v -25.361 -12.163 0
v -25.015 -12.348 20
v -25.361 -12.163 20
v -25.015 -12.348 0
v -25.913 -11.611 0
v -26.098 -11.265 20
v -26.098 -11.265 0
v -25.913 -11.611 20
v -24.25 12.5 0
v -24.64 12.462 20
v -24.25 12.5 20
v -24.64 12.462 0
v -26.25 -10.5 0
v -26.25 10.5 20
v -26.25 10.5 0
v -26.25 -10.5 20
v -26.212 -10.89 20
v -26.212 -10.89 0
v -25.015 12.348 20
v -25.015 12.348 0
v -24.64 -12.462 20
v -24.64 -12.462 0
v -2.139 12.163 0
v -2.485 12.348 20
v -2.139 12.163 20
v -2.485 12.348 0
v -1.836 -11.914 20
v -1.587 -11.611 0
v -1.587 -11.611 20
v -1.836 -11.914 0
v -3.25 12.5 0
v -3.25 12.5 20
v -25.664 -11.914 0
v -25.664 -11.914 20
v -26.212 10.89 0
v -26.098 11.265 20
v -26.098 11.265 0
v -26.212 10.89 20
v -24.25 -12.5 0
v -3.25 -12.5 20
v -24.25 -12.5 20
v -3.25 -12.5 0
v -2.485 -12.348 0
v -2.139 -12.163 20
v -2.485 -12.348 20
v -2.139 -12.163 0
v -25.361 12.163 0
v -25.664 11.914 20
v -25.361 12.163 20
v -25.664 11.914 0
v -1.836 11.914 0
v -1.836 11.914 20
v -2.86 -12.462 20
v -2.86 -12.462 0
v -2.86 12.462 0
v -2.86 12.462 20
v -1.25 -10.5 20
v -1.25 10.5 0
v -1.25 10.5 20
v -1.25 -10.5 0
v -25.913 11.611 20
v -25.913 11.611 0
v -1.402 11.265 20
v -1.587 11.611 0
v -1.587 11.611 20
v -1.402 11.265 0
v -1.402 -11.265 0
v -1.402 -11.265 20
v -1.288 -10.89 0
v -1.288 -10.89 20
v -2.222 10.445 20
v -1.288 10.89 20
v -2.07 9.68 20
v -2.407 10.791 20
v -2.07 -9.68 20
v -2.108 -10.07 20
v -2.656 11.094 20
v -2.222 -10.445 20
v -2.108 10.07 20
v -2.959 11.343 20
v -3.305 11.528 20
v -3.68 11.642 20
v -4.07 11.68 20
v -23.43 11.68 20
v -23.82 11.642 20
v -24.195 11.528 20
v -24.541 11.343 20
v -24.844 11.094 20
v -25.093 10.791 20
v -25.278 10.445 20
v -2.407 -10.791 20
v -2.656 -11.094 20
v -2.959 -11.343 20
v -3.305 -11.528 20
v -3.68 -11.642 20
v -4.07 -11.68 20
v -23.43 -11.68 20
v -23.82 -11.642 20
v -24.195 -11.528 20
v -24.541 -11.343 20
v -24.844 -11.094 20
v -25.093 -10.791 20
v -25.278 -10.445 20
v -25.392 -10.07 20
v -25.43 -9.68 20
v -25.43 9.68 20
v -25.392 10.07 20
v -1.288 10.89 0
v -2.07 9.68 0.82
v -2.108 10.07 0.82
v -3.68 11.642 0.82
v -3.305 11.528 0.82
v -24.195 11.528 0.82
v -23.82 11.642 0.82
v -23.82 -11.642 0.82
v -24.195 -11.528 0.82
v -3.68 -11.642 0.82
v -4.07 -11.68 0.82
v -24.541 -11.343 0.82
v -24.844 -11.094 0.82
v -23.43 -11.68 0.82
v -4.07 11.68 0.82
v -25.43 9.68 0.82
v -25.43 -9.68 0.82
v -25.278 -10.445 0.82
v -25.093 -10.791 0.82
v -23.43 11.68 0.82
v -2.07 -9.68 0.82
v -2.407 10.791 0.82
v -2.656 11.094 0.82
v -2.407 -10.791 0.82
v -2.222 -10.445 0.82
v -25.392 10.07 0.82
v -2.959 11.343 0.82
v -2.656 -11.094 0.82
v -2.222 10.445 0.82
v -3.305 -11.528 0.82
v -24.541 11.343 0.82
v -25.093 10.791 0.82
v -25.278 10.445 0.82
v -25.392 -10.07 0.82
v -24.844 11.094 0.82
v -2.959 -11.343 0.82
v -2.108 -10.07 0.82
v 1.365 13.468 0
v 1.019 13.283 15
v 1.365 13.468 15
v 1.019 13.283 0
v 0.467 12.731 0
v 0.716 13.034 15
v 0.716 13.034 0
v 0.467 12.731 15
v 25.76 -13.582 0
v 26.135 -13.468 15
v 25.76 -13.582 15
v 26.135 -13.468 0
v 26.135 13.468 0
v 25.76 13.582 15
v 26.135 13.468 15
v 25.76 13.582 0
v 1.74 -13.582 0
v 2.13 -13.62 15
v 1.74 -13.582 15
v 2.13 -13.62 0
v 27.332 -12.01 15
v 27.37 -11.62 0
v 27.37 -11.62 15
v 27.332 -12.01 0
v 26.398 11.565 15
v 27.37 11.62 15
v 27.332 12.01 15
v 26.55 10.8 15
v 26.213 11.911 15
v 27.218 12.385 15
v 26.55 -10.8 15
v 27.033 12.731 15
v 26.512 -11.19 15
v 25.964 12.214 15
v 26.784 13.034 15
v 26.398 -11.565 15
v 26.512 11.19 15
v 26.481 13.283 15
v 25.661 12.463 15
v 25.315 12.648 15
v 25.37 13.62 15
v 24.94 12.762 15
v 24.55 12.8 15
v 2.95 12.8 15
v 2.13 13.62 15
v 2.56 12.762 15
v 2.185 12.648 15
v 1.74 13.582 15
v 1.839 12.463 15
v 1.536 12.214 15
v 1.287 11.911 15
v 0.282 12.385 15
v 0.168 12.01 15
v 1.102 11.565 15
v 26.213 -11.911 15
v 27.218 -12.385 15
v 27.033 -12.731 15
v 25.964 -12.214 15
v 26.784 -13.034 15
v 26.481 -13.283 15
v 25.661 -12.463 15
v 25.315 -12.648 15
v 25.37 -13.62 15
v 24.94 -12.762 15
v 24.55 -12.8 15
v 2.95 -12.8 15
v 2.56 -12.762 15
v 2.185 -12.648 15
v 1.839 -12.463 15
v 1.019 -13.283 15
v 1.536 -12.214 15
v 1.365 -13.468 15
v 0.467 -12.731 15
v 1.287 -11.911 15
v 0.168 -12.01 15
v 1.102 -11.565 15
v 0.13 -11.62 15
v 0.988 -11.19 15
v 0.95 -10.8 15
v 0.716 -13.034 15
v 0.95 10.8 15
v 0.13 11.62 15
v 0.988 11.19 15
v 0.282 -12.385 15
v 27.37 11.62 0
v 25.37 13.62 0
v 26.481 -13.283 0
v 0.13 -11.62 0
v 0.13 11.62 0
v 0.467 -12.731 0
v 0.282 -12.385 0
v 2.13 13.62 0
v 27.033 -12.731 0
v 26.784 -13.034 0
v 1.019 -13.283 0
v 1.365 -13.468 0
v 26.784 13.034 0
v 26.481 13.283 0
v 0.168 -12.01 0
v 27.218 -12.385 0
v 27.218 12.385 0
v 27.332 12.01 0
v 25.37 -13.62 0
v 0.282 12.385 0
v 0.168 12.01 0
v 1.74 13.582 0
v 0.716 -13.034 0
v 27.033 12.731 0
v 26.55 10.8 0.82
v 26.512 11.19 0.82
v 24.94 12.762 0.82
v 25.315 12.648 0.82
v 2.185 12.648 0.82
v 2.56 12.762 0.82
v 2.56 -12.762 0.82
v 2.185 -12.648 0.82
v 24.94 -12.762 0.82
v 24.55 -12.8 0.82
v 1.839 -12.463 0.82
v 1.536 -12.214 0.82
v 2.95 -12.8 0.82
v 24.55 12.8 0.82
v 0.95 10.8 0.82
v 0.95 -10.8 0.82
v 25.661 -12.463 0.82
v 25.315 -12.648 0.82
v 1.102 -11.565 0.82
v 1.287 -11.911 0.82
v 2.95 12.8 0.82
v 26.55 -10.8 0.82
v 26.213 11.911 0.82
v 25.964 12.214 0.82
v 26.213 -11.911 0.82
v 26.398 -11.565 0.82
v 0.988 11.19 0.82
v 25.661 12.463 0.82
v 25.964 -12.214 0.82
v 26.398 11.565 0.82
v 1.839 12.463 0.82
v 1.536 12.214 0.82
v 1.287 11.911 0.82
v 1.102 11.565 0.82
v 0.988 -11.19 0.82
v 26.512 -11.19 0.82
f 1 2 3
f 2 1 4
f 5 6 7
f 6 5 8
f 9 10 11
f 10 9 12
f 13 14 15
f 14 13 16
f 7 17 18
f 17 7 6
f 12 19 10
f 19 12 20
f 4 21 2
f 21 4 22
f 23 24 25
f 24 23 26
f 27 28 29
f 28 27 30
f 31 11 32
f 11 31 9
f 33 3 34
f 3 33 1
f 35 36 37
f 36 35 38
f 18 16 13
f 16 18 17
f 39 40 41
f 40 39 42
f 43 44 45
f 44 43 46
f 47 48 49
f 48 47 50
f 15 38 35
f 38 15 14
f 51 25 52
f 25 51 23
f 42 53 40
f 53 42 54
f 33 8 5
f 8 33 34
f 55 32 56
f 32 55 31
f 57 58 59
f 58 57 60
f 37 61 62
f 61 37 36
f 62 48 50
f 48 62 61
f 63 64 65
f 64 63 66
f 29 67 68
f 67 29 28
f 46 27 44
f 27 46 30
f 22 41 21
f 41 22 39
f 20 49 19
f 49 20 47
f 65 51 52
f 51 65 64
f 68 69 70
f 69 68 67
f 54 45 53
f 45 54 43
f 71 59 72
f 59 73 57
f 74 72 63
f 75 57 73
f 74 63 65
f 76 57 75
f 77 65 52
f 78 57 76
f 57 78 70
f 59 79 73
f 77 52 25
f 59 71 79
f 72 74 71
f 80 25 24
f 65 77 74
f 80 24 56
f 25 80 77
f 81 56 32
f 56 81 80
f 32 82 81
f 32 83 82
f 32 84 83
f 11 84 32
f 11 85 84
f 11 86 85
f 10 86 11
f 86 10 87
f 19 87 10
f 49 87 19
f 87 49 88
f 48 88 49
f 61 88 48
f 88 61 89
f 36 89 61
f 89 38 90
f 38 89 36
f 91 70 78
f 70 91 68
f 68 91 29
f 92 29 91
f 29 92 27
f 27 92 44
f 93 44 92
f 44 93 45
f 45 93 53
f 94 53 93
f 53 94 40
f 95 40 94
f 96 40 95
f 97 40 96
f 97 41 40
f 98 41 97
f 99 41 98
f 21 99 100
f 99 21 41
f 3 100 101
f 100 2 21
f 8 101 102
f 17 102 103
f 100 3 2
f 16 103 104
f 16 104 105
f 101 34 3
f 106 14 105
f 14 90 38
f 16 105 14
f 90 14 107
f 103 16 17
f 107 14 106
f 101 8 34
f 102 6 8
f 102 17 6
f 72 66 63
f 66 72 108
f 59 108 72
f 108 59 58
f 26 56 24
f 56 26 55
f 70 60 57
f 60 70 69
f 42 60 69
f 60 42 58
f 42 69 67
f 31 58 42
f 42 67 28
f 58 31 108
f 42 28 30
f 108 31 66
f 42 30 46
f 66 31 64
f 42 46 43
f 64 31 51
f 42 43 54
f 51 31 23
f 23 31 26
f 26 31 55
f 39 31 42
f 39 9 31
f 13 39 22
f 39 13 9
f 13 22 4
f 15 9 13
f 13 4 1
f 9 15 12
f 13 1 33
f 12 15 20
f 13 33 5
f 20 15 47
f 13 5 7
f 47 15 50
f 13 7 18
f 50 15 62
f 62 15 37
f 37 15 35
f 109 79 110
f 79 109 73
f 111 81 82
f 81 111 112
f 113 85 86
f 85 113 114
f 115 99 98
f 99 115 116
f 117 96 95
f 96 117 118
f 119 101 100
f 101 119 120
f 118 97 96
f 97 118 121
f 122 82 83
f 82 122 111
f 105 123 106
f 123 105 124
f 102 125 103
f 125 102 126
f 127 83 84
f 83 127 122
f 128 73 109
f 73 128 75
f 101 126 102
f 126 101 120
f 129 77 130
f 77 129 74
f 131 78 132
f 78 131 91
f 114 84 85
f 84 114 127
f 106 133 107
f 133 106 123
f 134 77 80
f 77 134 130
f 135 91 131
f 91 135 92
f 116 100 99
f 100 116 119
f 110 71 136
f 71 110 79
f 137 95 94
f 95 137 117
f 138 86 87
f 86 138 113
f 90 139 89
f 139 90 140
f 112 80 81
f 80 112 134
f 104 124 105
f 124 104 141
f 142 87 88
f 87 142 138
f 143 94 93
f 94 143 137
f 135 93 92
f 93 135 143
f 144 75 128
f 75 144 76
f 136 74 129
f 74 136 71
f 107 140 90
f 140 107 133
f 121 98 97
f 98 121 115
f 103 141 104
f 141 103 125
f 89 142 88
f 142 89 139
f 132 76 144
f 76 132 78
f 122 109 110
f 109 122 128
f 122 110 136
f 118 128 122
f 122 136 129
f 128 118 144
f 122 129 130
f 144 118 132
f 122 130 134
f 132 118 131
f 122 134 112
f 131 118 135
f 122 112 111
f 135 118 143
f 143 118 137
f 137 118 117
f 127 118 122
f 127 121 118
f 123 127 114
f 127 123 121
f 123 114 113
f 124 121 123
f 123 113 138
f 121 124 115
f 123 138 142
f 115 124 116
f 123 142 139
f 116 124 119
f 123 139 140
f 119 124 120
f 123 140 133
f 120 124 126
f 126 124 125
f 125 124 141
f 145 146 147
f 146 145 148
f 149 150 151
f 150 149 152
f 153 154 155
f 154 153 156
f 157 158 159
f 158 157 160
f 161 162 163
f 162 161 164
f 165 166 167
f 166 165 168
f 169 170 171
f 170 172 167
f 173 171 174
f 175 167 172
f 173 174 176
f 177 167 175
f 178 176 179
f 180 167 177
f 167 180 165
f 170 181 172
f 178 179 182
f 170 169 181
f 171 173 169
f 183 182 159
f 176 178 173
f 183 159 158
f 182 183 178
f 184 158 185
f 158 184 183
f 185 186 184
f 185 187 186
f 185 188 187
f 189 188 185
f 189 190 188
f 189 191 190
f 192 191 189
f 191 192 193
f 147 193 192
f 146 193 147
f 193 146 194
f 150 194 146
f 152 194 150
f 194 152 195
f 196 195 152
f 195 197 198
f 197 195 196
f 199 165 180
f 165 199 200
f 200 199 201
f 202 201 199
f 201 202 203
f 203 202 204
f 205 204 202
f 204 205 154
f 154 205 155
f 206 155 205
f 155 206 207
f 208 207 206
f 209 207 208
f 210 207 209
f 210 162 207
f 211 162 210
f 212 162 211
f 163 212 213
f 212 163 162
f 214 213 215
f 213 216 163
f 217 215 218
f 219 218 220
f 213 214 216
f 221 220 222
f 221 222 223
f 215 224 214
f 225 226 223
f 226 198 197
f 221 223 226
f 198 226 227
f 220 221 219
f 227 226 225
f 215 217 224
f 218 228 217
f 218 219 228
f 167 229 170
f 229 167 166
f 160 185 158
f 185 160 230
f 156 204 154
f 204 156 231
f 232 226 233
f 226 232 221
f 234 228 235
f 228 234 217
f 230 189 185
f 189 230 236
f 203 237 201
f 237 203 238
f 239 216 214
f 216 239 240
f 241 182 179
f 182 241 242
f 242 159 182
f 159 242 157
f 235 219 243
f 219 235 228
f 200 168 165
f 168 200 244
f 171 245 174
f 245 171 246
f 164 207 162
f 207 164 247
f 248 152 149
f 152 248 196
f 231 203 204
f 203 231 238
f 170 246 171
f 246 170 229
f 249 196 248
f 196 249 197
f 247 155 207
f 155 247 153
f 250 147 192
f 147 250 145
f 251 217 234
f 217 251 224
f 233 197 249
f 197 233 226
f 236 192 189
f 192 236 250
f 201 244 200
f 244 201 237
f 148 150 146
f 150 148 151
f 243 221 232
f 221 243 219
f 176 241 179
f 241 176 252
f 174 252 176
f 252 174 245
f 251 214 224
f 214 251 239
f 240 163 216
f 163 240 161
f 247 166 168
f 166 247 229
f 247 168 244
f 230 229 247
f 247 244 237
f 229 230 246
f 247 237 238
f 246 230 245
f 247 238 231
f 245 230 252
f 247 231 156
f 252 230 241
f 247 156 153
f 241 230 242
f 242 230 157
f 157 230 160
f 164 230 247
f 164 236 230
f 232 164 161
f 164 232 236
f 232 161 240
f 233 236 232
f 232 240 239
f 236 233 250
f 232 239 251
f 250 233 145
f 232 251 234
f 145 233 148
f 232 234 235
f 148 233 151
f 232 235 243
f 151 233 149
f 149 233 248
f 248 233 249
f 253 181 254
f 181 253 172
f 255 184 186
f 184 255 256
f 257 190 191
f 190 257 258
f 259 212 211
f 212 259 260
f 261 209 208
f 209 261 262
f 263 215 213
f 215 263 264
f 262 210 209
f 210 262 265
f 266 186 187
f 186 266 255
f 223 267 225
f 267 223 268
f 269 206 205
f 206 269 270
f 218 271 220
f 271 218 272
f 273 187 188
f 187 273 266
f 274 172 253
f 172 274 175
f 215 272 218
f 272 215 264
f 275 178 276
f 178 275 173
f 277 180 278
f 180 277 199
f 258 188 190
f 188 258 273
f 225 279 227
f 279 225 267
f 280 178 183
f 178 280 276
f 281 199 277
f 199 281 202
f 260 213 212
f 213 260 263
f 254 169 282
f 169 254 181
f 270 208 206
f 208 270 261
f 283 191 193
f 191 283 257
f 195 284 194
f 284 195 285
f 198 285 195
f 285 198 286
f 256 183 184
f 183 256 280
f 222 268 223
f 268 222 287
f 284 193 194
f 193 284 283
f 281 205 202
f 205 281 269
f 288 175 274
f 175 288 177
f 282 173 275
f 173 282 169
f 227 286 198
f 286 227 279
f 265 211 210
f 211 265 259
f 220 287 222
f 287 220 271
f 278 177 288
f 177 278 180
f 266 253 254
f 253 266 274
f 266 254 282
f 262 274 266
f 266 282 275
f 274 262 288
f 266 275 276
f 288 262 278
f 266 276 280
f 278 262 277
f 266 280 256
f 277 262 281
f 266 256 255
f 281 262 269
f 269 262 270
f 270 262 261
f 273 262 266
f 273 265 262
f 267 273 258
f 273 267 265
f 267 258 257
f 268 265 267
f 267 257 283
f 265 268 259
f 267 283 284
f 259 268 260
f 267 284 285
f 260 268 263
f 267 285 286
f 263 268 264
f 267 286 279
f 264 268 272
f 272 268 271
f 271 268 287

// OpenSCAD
wall_thickness = 0.82;          //Box perimiter thickness
lid_thickness = 0.82;           //lid top/bottom thickness
lid_clearance = 0.6;            //This sets the distance between the the lid and lower half of the box

//These dimensions are for the OUTSIDE of the inner box.
height = 20;
width = 25;
length = 25;
radius = 2;

//These dimensions are for the lid. 
lid_height = 15;


//Resolution of the fillets
resolution = 32;


module rounded_rect(x, y, radius, height){
    if (radius > 0){
        hull(){
            translate([-x/2 + radius, y/2 - radius, 0])
            cylinder(h = height, r = radius, center = true, $fn=$fn);
            
            translate([x/2 - radius, y/2 - radius, 0])
            cylinder(h = height, r = radius, center = true, $fn=$fn);
            
            translate([-x/2 + radius, -y/2 + radius, 0])
            cylinder(h = height, r = radius, center = true, $fn=$fn);
            
            translate([x/2 - radius, -y/2 + radius, 0])
            cylinder(h = height, r = radius, center = true, $fn=$fn);
        }
    }else{
        cube([x, y, height], center = true);
    }
}

module bottom(){
    translate([0,0,height/2])
        difference(){
            rounded_rect(width, length, radius, height, $fn=resolution);
            translate([0,0, lid_thickness])
            rounded_rect(width - wall_thickness * 2, length - wall_thickness * 2, radius, height, $fn=resolution);
        }
}

module top(){
    _outside_lid = wall_thickness * 2 + lid_clearance;
    translate([0,0,lid_height/2])
    difference(){
        rounded_rect(width + _outside_lid , length + _outside_lid , radius, lid_height, $fn=resolution);
        translate([0, 0, lid_thickness])
        rounded_rect(width + lid_clearance, length + lid_clearance, radius, lid_height, $fn=resolution);
    }
}

translate([-width * 0.55,0,0])
    bottom();
translate([width * 0.55,0,0])
    top();
